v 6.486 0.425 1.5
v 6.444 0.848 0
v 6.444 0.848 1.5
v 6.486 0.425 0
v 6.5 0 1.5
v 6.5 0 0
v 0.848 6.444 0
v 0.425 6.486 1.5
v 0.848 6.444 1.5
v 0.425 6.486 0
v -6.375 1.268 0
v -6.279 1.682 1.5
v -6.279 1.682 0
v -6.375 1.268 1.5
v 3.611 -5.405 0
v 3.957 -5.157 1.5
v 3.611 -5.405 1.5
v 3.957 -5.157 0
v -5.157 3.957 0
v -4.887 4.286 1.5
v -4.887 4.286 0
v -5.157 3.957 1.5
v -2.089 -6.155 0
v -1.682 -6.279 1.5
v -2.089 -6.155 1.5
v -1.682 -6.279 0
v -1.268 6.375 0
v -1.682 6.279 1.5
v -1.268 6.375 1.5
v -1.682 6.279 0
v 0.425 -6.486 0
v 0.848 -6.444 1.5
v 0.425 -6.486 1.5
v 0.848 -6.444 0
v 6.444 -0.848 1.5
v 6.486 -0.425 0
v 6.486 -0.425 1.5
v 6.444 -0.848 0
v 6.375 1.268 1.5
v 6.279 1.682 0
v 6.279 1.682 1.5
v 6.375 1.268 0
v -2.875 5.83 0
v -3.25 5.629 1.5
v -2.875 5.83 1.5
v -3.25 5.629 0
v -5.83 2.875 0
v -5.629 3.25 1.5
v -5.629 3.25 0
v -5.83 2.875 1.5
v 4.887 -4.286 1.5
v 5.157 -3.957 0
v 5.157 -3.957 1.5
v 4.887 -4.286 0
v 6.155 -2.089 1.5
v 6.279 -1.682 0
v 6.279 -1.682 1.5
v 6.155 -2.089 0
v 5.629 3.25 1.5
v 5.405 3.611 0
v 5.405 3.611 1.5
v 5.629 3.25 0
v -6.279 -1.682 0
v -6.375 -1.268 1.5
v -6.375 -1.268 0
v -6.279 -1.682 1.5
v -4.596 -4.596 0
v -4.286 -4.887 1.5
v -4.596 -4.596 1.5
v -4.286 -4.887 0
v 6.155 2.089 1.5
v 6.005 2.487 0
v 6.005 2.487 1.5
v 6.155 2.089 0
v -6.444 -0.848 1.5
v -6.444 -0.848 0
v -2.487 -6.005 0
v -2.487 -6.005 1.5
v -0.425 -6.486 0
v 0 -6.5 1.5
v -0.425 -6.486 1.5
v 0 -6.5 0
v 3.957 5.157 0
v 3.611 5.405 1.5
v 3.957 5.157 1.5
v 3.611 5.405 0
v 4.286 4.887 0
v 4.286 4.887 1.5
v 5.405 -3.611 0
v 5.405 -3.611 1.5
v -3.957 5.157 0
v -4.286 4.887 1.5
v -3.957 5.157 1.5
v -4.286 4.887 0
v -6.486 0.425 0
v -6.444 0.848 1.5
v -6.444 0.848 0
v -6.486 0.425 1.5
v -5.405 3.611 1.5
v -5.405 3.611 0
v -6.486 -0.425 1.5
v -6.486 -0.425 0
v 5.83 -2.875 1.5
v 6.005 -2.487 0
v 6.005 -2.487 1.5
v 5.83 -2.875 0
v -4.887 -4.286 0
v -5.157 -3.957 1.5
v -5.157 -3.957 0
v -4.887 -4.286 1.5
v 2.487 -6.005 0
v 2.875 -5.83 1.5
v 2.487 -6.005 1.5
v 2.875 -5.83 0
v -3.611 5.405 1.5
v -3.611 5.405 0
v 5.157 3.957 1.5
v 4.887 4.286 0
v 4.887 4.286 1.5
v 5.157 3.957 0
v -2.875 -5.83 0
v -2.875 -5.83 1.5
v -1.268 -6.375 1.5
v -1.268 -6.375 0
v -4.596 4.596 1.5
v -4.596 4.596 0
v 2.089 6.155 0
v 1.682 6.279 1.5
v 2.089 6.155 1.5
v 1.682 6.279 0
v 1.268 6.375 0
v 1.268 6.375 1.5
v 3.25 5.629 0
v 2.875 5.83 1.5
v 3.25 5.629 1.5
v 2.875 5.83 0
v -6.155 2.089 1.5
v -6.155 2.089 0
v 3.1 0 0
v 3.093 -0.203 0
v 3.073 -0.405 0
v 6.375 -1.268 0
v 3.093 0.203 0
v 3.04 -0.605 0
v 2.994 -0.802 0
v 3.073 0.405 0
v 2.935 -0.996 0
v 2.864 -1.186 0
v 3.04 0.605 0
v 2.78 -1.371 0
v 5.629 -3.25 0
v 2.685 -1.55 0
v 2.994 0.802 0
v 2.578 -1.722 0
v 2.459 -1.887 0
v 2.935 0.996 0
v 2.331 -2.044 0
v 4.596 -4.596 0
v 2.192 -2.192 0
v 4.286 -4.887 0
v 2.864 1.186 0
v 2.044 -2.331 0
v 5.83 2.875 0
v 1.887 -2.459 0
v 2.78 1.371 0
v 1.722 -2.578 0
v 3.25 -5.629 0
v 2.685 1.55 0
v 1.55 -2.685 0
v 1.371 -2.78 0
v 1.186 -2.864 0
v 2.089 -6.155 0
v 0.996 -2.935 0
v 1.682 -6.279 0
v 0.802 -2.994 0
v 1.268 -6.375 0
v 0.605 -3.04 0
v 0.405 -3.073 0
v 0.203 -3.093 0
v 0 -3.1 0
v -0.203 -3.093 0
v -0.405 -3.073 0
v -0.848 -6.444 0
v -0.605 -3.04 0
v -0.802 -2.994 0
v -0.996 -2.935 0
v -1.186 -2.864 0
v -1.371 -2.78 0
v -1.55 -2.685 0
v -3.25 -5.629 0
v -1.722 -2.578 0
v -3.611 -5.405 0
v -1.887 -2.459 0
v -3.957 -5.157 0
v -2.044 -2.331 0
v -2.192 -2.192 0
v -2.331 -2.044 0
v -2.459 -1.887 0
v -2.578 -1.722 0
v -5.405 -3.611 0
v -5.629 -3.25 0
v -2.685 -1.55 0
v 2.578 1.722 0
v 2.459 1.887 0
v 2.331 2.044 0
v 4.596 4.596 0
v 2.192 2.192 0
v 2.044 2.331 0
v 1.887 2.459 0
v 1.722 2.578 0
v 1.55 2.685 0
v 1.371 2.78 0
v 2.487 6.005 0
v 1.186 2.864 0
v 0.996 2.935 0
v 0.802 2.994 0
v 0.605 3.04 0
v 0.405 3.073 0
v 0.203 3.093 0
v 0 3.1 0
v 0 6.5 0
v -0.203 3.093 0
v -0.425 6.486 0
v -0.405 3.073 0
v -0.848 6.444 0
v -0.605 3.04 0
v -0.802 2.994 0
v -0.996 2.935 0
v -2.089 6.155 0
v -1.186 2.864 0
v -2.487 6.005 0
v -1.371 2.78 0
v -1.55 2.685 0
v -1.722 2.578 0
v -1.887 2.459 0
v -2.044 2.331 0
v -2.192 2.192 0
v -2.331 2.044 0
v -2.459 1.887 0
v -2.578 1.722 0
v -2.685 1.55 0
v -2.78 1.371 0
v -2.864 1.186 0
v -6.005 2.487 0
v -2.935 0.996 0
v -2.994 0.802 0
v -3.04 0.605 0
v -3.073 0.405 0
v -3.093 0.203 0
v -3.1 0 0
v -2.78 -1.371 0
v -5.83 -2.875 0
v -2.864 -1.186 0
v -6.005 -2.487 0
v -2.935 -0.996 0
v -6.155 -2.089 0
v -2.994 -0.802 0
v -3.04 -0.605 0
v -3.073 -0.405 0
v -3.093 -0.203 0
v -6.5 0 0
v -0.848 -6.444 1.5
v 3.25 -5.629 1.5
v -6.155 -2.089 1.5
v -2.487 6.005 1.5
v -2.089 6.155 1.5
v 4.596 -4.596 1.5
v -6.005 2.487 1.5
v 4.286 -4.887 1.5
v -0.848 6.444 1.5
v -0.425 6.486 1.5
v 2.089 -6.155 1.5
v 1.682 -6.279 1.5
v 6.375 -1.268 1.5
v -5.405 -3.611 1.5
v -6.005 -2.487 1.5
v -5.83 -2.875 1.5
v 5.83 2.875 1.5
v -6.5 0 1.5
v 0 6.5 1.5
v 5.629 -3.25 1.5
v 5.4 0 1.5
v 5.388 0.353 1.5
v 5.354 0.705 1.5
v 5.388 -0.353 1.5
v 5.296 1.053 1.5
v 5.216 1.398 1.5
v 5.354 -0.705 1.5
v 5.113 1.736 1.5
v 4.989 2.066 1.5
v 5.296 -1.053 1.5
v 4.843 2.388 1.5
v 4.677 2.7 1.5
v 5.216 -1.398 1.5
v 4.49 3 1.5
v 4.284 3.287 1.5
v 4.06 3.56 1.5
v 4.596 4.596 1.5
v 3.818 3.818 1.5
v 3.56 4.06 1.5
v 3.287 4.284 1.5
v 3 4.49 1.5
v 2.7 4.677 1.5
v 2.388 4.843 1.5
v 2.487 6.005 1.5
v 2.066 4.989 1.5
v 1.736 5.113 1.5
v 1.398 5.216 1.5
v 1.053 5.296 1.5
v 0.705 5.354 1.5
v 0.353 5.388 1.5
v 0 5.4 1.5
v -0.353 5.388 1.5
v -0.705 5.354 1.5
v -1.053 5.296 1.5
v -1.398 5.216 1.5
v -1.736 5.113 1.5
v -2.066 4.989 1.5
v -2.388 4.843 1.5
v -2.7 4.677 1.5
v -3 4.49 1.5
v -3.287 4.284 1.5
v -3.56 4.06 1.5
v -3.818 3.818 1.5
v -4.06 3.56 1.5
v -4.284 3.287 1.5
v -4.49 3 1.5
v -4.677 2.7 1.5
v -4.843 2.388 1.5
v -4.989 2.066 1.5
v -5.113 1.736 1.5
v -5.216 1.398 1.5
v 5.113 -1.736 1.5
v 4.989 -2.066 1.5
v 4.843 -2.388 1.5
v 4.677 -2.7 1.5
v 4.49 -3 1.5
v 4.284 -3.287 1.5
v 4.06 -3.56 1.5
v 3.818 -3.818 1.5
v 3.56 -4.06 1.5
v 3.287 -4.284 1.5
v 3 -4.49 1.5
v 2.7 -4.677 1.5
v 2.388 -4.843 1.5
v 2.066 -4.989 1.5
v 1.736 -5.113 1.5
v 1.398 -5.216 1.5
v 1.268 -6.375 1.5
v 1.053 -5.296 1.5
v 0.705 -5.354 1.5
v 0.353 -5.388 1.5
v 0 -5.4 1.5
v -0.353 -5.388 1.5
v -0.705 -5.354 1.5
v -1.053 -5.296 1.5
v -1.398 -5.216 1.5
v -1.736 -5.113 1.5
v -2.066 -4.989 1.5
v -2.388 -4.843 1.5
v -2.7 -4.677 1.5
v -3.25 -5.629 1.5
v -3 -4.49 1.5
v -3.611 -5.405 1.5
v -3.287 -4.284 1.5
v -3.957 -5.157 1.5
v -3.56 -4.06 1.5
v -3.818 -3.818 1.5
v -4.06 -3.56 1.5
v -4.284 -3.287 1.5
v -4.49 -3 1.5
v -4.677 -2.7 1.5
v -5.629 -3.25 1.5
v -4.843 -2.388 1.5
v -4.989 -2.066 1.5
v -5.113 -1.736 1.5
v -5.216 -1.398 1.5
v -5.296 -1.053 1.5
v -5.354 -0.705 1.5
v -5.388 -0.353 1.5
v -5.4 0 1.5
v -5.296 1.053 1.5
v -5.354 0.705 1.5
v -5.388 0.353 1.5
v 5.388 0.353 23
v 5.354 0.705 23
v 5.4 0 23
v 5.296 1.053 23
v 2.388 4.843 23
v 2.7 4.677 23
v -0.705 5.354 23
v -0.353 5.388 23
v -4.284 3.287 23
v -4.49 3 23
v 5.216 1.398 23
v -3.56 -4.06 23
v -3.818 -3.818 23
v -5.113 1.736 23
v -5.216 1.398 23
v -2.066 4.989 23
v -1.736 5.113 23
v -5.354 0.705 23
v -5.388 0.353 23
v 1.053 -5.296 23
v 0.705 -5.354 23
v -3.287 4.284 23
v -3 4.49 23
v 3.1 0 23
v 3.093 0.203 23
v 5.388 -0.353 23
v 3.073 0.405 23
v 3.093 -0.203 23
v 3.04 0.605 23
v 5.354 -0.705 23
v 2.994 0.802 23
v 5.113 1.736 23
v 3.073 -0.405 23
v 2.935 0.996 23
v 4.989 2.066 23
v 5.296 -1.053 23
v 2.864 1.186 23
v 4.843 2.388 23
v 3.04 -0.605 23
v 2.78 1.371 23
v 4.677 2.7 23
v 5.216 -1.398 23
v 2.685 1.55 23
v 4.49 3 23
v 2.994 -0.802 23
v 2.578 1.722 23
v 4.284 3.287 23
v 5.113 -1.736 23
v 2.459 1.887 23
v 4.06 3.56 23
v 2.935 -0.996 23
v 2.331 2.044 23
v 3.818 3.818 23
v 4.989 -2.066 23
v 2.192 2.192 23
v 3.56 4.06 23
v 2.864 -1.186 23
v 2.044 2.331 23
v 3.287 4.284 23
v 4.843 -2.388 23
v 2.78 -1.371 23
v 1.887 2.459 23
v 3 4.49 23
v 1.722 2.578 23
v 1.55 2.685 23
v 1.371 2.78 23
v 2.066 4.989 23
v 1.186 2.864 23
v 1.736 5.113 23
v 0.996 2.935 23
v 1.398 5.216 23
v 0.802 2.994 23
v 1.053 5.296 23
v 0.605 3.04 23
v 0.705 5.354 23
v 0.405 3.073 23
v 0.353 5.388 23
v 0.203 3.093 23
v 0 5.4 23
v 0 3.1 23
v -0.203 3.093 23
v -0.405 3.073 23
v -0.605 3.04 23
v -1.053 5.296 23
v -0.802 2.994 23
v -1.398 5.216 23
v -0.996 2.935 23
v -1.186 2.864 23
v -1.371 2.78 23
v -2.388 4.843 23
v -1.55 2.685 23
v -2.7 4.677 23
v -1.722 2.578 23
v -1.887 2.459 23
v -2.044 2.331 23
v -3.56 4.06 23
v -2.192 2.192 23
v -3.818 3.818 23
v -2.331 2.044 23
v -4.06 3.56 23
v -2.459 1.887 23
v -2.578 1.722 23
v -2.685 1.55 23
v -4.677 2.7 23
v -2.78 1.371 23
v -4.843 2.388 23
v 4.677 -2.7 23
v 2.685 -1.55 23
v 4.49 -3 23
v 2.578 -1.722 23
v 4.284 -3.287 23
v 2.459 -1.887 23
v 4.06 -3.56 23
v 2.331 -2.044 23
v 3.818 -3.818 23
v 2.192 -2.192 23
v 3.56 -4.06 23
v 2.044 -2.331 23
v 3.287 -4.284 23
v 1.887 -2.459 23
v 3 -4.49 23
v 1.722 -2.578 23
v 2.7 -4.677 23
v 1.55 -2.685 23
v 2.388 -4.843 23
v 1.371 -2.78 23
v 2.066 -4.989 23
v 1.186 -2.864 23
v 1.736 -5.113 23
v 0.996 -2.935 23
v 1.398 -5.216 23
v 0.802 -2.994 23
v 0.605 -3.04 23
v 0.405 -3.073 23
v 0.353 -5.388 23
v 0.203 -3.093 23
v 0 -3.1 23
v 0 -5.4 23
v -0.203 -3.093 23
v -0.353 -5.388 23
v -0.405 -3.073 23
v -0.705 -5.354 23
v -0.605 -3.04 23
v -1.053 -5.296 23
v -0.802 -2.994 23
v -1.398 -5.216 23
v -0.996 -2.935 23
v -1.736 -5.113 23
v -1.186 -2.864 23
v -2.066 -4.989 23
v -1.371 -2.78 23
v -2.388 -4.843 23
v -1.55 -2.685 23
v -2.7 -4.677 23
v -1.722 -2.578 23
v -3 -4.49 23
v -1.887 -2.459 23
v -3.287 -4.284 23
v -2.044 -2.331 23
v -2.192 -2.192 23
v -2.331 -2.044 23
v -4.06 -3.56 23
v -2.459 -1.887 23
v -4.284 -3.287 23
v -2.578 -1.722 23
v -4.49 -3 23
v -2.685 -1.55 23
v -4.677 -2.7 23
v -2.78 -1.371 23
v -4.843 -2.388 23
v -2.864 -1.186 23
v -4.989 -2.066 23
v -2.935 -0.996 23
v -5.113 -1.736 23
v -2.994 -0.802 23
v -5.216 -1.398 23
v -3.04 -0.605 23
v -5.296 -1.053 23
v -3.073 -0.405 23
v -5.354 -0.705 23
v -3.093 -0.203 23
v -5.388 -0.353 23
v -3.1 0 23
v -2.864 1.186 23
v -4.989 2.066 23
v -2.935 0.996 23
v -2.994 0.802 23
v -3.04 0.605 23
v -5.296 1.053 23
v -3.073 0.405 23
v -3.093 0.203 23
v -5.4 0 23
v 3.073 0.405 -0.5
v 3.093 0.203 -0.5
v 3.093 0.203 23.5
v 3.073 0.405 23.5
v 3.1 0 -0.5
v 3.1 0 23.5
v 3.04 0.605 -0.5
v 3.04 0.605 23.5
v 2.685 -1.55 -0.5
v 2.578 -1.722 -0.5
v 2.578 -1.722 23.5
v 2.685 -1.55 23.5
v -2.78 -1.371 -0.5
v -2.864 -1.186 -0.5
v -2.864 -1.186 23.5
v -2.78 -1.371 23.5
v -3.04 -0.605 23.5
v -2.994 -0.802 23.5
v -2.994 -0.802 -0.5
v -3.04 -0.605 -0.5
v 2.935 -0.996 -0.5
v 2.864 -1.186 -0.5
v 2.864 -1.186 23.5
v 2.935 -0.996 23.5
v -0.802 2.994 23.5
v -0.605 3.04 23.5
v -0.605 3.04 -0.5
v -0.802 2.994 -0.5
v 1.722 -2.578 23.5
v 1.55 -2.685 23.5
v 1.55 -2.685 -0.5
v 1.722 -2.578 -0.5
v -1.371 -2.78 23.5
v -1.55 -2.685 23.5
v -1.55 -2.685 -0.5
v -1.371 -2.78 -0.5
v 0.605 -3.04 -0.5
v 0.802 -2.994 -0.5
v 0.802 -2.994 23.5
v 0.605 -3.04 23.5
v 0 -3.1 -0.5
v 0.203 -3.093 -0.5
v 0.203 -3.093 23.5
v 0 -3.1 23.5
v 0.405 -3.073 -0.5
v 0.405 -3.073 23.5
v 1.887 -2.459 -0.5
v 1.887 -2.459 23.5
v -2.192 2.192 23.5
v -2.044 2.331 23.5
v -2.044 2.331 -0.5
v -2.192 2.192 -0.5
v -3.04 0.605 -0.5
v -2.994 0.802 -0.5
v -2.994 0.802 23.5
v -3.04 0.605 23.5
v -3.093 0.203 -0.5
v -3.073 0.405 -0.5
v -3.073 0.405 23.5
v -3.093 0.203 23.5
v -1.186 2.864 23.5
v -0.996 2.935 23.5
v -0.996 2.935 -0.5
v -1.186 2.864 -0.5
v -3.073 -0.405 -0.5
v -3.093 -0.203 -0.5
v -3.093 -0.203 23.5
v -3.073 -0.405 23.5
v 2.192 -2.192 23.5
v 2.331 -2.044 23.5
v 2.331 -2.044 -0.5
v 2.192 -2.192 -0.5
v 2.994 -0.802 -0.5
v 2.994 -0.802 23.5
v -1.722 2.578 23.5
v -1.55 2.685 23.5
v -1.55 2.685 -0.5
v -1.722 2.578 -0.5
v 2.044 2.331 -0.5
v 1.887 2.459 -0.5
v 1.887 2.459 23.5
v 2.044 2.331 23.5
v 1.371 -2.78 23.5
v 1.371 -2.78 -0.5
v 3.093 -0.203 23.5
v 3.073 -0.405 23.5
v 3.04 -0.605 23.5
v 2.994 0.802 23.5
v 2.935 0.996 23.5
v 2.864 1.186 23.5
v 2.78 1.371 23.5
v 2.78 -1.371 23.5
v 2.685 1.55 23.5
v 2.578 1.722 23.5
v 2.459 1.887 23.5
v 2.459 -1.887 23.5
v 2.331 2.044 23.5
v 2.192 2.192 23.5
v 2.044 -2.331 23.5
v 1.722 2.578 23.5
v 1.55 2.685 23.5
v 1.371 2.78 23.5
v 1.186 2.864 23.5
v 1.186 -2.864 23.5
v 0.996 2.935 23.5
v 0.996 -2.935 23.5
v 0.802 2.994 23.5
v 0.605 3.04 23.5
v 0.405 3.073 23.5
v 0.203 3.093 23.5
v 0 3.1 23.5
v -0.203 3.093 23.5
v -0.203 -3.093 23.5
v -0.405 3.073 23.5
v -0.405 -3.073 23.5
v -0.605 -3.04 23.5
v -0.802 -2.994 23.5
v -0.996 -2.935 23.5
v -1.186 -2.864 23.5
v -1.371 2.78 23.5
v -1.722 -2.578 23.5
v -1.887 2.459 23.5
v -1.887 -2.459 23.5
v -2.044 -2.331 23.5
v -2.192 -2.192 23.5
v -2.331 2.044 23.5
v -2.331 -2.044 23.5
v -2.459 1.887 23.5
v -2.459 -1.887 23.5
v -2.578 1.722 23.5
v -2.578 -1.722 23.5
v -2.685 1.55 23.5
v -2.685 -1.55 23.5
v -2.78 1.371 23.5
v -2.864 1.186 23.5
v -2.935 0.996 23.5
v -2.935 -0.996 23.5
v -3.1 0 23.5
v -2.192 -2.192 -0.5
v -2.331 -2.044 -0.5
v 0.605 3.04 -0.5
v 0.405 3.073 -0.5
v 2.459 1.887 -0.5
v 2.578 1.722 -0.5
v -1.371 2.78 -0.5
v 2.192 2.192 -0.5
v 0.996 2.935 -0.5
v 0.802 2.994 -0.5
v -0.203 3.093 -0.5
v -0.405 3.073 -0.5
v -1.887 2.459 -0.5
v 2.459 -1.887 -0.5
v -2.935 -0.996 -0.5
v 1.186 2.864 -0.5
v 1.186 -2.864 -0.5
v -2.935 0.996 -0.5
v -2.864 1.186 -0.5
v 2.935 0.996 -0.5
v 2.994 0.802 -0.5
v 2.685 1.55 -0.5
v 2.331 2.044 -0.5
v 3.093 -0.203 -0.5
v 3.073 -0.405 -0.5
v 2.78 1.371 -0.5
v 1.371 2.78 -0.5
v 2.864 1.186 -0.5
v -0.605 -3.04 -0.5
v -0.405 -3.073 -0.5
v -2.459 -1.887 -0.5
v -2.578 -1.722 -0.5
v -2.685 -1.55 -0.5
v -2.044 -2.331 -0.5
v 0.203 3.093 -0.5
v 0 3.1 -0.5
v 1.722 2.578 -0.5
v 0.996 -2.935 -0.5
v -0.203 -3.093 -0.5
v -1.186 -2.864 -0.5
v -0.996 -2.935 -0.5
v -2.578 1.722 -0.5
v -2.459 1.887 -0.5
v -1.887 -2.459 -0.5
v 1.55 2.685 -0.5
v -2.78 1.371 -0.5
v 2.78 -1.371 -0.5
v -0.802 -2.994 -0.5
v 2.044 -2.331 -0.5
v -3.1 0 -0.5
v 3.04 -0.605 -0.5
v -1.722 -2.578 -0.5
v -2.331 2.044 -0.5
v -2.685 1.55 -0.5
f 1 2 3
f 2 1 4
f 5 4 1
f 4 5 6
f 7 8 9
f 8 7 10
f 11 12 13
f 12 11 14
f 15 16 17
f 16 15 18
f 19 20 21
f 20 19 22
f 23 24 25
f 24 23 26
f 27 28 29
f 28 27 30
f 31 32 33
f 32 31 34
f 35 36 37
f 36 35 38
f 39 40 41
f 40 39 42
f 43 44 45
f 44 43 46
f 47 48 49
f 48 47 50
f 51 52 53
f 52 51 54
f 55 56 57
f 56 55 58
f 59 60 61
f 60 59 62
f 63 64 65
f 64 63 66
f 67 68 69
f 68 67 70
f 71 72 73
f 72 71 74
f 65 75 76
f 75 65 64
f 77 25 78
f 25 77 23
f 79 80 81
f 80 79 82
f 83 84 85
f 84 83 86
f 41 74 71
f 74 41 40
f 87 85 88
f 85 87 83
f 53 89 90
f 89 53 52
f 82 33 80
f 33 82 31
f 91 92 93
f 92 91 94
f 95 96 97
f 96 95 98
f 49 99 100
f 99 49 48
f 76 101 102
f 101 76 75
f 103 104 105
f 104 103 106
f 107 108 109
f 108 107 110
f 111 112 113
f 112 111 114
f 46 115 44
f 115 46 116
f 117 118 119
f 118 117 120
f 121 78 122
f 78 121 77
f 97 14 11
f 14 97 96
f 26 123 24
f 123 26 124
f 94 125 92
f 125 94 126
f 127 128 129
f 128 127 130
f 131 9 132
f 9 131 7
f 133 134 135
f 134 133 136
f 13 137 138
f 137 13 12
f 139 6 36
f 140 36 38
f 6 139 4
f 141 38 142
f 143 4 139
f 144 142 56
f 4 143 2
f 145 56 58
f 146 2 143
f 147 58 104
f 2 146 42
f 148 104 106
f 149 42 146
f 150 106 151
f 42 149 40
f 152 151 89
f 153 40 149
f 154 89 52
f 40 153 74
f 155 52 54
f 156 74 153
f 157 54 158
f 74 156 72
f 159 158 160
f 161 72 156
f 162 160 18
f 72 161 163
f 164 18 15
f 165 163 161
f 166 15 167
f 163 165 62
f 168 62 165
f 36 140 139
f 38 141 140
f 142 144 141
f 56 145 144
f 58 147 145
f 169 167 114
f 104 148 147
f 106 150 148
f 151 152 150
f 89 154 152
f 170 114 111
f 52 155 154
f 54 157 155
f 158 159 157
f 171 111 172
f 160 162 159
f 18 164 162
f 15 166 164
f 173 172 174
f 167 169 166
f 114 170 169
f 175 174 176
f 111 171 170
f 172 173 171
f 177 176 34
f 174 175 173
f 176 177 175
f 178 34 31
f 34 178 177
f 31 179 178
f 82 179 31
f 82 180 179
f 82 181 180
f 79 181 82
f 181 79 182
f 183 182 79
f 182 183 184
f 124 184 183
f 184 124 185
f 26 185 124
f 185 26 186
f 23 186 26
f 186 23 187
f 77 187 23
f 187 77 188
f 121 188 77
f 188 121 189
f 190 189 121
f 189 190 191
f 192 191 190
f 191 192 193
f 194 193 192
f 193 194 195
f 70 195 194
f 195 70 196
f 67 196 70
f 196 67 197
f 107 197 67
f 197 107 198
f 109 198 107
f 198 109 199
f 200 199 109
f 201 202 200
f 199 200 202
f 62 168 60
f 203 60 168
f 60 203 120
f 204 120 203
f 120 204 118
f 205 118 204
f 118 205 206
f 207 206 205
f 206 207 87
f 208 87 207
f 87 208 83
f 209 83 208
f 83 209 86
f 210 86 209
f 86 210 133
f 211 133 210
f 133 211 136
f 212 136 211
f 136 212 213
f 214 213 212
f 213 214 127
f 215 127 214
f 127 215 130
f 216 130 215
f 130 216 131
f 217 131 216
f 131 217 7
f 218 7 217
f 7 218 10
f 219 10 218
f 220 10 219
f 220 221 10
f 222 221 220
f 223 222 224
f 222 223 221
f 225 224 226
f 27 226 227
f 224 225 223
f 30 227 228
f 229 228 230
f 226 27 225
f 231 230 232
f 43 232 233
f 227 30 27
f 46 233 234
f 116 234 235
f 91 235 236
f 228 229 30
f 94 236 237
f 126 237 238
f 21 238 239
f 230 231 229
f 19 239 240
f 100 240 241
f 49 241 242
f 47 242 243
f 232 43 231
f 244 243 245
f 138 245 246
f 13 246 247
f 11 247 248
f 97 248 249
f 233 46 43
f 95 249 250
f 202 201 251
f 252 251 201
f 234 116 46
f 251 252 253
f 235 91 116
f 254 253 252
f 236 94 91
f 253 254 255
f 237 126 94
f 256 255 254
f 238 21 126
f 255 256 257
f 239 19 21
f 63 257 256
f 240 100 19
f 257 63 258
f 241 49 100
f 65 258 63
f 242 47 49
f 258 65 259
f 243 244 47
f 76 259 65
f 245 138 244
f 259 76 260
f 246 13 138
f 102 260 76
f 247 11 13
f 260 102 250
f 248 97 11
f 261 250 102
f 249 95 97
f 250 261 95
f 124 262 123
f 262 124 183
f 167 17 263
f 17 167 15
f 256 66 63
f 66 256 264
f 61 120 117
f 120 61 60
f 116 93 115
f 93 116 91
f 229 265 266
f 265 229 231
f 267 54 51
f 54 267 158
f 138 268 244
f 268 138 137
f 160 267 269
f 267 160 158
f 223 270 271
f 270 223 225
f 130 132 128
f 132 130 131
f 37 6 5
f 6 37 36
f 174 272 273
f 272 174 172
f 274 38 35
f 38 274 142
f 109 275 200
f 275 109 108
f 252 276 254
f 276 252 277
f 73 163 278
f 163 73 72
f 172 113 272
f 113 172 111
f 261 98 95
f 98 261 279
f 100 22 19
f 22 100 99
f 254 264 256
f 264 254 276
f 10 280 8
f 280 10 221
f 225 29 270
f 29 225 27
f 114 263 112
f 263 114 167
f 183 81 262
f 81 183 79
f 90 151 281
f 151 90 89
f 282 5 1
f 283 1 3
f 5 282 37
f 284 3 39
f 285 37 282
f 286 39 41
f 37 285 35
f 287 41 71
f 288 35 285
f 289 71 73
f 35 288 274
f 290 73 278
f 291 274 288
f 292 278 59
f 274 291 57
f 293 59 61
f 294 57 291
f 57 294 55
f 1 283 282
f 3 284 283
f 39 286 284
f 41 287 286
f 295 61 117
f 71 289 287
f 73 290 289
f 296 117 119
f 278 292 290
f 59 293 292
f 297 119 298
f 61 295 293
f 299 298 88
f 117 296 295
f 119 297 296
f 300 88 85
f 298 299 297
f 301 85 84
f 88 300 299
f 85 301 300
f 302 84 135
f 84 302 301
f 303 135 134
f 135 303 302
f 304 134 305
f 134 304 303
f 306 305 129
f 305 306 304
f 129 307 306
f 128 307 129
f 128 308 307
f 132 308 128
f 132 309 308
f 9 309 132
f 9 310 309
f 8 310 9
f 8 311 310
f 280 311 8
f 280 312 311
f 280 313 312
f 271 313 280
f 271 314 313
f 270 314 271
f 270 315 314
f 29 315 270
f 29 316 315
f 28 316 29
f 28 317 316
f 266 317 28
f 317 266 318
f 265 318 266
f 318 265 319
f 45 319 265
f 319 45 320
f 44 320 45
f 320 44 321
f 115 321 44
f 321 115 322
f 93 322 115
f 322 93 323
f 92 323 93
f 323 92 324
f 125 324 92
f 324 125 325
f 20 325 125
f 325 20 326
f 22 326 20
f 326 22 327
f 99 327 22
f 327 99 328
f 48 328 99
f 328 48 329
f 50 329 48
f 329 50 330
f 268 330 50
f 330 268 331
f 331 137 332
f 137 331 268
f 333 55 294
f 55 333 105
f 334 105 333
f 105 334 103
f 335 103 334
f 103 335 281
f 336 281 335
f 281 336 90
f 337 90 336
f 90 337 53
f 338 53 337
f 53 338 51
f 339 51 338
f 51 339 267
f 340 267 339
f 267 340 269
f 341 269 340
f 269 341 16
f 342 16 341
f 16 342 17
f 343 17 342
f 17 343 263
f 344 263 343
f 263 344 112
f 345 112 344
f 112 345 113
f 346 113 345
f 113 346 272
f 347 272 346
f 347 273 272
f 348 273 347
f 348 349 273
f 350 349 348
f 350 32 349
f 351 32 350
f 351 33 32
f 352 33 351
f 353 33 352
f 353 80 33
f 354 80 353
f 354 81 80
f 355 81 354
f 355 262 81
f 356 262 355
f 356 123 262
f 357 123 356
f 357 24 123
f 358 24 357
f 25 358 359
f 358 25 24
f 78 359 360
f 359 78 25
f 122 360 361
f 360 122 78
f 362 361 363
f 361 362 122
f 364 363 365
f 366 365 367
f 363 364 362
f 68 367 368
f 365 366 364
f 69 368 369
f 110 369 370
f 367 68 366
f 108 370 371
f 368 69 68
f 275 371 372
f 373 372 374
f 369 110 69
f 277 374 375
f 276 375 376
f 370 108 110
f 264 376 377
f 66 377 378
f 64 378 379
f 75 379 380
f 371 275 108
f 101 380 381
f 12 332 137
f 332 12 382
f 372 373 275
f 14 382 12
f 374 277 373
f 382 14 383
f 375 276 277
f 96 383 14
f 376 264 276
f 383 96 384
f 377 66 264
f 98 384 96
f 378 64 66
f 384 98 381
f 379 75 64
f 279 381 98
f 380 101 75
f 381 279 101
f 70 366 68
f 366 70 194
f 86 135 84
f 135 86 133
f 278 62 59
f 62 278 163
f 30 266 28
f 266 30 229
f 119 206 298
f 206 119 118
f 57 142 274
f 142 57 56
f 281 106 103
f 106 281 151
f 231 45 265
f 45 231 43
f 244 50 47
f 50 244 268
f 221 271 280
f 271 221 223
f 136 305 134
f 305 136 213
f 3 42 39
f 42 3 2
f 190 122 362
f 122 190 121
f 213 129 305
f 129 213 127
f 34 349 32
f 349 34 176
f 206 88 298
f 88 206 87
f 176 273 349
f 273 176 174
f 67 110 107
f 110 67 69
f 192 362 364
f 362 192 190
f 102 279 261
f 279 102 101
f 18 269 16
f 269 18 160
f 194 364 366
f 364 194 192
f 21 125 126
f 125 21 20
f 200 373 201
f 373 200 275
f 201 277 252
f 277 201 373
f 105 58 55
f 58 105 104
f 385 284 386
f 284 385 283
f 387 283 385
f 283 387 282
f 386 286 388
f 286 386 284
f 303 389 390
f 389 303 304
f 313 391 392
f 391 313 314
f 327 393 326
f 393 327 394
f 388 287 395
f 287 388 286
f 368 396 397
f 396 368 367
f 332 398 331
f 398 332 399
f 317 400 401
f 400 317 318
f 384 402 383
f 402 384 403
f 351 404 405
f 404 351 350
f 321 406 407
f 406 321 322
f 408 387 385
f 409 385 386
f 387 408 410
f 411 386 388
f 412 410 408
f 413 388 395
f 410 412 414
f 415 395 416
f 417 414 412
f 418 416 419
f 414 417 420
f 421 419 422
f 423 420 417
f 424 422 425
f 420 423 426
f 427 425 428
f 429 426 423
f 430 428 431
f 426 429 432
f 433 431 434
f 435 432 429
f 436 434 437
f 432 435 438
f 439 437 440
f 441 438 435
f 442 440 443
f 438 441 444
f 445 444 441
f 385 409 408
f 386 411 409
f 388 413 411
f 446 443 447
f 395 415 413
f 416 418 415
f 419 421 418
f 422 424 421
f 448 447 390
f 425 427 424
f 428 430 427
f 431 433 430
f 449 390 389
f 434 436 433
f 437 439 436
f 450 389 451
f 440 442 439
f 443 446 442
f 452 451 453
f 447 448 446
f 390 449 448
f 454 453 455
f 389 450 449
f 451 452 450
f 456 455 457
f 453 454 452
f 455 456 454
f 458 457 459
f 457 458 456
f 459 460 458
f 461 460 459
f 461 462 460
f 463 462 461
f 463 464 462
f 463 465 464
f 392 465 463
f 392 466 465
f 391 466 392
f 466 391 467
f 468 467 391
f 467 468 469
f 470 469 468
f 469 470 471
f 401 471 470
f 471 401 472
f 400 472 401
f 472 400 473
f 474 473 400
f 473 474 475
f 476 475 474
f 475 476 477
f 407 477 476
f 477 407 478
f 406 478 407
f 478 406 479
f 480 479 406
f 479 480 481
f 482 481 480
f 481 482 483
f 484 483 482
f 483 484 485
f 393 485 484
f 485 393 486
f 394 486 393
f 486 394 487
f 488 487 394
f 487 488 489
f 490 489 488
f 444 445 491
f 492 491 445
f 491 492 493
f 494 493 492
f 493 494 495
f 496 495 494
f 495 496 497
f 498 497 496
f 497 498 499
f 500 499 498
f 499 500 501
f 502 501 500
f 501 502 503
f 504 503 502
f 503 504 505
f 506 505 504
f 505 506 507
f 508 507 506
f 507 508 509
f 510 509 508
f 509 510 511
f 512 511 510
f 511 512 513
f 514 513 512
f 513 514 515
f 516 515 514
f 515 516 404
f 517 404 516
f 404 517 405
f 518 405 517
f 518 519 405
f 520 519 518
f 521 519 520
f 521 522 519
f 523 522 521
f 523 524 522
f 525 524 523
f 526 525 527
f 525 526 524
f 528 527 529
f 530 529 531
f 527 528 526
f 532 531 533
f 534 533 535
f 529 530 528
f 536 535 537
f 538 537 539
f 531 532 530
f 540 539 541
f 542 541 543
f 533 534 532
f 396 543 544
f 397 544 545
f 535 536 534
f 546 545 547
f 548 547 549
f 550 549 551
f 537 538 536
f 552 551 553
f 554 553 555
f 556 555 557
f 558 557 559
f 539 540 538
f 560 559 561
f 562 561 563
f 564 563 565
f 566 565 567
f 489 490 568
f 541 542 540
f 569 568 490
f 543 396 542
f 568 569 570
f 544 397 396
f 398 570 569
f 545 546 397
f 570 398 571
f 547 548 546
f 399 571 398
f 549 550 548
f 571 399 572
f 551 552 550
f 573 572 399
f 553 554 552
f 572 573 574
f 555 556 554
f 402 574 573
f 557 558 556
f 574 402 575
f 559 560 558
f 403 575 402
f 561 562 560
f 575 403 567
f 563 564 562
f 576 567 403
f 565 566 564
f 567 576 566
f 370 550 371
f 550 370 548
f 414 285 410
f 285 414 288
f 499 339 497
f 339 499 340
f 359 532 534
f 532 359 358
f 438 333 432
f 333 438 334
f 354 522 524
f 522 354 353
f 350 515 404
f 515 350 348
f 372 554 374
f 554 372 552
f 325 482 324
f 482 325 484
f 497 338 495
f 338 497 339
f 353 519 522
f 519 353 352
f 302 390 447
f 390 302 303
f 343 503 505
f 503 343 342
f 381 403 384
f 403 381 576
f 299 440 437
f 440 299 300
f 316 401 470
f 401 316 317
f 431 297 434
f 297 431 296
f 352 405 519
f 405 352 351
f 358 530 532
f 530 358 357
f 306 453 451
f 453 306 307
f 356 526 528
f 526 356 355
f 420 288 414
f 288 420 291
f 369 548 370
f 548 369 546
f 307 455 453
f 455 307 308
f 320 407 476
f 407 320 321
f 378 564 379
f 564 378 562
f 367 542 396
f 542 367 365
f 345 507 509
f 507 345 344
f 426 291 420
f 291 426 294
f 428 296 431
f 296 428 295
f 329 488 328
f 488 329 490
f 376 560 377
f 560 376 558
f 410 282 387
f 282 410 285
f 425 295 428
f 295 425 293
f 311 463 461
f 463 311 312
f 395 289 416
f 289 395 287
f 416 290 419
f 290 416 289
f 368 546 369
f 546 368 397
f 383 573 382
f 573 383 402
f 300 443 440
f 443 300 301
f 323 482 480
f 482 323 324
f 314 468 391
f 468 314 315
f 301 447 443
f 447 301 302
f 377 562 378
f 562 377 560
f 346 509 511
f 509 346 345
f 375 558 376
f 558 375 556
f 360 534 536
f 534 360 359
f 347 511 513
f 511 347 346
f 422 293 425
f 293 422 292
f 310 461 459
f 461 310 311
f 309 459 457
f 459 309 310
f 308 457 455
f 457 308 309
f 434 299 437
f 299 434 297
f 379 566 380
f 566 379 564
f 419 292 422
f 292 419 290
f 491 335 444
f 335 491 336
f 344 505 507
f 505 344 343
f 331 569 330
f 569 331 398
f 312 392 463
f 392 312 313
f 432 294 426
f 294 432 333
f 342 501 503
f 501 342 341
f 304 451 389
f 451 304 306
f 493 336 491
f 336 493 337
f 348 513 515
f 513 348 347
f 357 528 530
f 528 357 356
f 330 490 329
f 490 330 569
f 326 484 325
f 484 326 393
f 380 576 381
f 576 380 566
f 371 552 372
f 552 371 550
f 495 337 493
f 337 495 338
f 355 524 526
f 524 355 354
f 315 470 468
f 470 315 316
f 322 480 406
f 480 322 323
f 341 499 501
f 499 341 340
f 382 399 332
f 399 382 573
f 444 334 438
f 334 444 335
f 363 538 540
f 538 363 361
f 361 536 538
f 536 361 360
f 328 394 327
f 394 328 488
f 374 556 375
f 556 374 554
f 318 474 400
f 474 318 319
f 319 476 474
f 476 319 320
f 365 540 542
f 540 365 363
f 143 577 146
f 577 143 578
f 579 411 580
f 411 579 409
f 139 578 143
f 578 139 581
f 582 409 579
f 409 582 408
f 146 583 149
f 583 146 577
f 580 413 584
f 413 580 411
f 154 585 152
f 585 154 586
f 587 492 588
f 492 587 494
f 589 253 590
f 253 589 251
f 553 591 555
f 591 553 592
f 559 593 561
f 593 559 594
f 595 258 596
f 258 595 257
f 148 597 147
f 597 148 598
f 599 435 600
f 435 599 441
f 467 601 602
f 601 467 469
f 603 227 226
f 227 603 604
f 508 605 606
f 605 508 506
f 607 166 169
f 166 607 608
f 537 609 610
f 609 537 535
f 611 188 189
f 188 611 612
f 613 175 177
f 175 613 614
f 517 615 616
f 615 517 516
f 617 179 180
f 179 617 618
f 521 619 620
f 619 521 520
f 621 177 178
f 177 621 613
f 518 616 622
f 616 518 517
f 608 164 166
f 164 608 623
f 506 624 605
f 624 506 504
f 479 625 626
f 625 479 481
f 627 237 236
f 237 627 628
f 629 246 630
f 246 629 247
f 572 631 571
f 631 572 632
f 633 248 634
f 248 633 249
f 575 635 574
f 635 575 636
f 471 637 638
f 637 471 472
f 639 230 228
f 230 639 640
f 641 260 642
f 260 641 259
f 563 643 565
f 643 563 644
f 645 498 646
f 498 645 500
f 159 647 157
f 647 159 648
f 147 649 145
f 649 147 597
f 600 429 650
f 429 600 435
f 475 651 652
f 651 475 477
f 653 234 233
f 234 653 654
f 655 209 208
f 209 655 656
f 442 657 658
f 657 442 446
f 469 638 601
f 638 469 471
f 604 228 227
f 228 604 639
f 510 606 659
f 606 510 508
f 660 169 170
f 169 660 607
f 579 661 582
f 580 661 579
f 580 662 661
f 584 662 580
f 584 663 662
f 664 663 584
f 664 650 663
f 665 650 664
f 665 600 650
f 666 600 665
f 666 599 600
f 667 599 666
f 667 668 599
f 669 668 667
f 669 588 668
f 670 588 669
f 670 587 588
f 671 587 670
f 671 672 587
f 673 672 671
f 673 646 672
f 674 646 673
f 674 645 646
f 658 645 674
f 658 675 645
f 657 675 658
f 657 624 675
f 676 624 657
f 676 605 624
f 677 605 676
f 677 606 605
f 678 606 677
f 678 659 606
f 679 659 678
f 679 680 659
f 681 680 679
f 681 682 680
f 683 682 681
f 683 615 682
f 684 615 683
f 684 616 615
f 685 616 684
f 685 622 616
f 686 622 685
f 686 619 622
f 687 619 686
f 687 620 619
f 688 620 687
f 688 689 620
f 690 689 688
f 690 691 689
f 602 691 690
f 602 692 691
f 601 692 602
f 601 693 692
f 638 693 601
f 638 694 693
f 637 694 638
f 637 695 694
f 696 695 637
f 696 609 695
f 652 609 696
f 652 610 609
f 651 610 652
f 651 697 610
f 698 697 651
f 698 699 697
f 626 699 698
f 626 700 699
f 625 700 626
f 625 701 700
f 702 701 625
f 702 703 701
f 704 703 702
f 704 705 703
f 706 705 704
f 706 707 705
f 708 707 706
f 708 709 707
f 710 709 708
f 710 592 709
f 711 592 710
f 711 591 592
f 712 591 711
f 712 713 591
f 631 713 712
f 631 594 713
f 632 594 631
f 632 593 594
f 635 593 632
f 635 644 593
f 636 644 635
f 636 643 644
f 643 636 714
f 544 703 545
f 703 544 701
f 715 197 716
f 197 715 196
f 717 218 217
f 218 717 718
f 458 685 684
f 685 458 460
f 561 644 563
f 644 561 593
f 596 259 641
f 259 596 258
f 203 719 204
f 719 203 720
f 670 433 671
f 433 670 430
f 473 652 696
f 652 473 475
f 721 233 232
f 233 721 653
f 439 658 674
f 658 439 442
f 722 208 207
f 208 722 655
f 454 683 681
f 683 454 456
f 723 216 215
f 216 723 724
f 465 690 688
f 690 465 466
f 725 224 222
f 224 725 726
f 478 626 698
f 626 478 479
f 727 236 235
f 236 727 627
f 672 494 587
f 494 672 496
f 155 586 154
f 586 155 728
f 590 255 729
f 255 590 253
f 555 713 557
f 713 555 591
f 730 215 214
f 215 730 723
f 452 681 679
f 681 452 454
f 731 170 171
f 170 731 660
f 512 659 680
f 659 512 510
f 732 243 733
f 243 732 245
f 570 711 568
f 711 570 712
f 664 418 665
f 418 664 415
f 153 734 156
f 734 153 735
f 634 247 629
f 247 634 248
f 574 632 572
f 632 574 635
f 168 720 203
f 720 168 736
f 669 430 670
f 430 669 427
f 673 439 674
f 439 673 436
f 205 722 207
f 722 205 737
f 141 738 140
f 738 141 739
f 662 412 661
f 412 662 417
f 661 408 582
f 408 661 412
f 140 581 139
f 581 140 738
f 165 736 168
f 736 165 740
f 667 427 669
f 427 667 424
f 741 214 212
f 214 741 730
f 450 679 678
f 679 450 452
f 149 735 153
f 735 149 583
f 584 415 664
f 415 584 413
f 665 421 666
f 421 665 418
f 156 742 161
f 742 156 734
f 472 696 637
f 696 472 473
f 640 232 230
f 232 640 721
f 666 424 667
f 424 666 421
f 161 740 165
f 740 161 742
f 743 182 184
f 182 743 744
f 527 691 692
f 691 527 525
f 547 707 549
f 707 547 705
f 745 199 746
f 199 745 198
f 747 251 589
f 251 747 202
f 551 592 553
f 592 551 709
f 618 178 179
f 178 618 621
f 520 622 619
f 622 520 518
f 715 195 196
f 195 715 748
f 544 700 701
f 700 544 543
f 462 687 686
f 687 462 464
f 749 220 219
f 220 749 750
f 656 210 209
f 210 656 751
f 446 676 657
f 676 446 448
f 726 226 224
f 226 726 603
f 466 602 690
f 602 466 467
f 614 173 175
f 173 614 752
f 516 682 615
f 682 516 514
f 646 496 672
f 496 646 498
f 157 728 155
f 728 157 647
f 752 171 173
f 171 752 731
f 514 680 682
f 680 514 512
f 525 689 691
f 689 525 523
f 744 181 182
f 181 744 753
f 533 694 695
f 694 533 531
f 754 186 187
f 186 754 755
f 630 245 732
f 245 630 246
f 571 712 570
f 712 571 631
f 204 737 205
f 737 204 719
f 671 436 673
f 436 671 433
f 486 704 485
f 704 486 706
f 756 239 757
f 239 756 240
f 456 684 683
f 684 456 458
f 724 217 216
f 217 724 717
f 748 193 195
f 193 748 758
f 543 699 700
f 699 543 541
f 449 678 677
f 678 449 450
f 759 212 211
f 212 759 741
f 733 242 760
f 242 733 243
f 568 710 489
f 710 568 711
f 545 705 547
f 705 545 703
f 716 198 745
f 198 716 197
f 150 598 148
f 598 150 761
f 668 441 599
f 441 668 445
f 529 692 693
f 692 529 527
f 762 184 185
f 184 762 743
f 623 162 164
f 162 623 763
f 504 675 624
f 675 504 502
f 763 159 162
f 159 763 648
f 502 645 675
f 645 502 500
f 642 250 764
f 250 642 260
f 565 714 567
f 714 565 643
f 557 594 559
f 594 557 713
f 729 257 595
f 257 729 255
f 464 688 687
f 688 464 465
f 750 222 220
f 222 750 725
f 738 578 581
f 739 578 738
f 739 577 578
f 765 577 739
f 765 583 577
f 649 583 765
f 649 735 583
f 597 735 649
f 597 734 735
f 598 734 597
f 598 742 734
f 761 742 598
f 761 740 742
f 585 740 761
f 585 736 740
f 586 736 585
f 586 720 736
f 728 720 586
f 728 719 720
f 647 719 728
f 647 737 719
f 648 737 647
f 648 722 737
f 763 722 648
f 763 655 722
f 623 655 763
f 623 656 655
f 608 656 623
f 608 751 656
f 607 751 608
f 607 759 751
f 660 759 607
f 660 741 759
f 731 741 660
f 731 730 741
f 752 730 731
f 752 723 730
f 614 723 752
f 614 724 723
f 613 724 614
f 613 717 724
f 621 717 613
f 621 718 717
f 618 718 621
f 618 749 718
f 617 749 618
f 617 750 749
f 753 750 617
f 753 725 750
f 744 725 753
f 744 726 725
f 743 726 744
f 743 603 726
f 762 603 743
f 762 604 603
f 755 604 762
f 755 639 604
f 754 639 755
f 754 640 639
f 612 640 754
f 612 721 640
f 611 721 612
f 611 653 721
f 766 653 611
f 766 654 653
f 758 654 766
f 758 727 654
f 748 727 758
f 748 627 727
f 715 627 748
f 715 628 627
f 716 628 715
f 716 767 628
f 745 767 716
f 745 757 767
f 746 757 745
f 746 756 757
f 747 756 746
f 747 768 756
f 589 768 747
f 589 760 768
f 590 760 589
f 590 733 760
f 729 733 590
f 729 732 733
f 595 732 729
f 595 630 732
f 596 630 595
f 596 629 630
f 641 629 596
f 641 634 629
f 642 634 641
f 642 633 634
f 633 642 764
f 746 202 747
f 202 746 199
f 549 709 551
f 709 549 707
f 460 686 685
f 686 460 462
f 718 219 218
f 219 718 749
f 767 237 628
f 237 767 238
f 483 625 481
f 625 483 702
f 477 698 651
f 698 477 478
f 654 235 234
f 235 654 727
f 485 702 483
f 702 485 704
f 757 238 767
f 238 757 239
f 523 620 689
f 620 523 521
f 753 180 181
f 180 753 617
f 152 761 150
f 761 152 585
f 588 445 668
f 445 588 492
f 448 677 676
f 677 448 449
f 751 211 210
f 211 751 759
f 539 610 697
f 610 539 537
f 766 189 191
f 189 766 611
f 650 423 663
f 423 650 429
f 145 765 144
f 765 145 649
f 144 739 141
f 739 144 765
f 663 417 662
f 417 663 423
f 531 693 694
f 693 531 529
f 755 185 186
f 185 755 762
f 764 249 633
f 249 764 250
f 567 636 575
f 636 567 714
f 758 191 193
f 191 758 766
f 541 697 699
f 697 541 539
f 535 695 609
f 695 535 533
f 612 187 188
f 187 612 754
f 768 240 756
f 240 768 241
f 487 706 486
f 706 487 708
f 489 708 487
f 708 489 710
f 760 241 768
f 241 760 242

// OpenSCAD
// PCR tube adapter sleeve - print upside down
// Units: mm

// ---- Dimensions ----
collar_d        = 13;    // collar outer diameter
collar_t        = 1.5;   // collar thickness (z = 0 to 1.5)
sleeve_od       = 10.8;  // sleeve outer diameter
sleeve_h        = 21.5;  // sleeve body height above collar (z = 1.5 to 23.0)
bore_d          = 6.2;   // straight through-bore diameter
eps             = 0.5;   // cutter overshoot past faces

$fn = 96;

// ---- Model ----
union() {
    // Collar lying on the bed
    cylinder(d = collar_d, h = collar_t);

    // Sleeve body rising from the collar top
    translate([0, 0, collar_t])
        cylinder(d = sleeve_od, h = sleeve_h);
}

// Full-height bore, open at both ends
translate([0, 0, -eps])
    cylinder(d = bore_d, h = collar_t + sleeve_h + 2 * eps);
